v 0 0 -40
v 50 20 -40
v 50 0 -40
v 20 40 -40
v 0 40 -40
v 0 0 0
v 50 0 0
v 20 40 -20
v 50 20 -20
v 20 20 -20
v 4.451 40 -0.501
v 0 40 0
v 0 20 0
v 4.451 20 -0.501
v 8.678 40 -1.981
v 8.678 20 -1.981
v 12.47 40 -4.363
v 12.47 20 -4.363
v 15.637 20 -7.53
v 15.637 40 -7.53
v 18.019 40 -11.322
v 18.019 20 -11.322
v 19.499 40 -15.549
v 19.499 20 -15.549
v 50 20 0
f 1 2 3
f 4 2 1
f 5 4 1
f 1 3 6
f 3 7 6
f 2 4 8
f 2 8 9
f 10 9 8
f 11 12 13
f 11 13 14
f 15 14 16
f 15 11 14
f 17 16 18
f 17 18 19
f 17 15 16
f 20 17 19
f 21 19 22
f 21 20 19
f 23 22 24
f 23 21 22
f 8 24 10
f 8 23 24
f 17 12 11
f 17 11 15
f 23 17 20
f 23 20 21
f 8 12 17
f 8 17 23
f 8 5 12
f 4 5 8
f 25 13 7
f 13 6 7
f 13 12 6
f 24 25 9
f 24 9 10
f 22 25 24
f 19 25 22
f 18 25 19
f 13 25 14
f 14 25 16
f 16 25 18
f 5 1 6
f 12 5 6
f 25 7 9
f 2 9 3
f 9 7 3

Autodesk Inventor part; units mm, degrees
ref_plane "YZ Plane" through (0, 0, 0) normal (1, 0, 0) x (0, 1, 0)
ref_plane "XZ Plane" through (0, 0, 0) normal (0, 1, 0) x (-1, 0, 0)
ref_plane "XY Plane" through (0, 0, 0) normal (0, 0, 1) x (1, 0, 0)
sketch "草圖1" plane through (0, 0, 0) normal (0, 1, 0) x (-1, 0, 0)
  line L0 (0, 0) -> (-50, 0)
  line L1 (-50, 0) -> (-50, -40)
  line L2 (-50, -40) -> (0, -40)
  line L3 (0, -40) -> (0, 0)
  dimension "d0" = 50
  dimension "d1" = 40
extrude "擠出1" add sketch "草圖1" along normal blind 20
sketch "草圖2" plane through (0, 20, 0) normal (0, 1, 0) x (1, 0, 0)
  line L0 (0, 40) -> (20, 40)
  line L1 (20, 40) -> (20, 0)
  line L2 (20, 0) -> (0, 0)
  line L3 (0, 0) -> (0, 40)
  line L4 (50, 40) -> (0, 40) projected
  line L5 (0, 40) -> (0, 0) projected
  dimension "d4" = 20
extrude "擠出2" add sketch "草圖2" along normal blind 20
fillet "圓角1" radius 20 1 edges at (20, 30, 0)
sketch "草圖3" plane through (50, 0, -40) normal (0, 0, -1) x (-1, 0, 0)
  line L0 (30, 40) -> (50, 40) projected
  line L1 (0, 20) -> (30, 20) projected
  line L2 (30, 40) -> (0, 20)
  line L3 (0, 20) -> (30, 20)
  line L4 (30, 20) -> (30, 40) projected
  line L5 (30, 20) -> (30, 40)
  point P0 (50, 0)
extrude "擠出3" add sketch "草圖3" against normal blind 20
properties part number "39 (60283.185 mm^3)"
